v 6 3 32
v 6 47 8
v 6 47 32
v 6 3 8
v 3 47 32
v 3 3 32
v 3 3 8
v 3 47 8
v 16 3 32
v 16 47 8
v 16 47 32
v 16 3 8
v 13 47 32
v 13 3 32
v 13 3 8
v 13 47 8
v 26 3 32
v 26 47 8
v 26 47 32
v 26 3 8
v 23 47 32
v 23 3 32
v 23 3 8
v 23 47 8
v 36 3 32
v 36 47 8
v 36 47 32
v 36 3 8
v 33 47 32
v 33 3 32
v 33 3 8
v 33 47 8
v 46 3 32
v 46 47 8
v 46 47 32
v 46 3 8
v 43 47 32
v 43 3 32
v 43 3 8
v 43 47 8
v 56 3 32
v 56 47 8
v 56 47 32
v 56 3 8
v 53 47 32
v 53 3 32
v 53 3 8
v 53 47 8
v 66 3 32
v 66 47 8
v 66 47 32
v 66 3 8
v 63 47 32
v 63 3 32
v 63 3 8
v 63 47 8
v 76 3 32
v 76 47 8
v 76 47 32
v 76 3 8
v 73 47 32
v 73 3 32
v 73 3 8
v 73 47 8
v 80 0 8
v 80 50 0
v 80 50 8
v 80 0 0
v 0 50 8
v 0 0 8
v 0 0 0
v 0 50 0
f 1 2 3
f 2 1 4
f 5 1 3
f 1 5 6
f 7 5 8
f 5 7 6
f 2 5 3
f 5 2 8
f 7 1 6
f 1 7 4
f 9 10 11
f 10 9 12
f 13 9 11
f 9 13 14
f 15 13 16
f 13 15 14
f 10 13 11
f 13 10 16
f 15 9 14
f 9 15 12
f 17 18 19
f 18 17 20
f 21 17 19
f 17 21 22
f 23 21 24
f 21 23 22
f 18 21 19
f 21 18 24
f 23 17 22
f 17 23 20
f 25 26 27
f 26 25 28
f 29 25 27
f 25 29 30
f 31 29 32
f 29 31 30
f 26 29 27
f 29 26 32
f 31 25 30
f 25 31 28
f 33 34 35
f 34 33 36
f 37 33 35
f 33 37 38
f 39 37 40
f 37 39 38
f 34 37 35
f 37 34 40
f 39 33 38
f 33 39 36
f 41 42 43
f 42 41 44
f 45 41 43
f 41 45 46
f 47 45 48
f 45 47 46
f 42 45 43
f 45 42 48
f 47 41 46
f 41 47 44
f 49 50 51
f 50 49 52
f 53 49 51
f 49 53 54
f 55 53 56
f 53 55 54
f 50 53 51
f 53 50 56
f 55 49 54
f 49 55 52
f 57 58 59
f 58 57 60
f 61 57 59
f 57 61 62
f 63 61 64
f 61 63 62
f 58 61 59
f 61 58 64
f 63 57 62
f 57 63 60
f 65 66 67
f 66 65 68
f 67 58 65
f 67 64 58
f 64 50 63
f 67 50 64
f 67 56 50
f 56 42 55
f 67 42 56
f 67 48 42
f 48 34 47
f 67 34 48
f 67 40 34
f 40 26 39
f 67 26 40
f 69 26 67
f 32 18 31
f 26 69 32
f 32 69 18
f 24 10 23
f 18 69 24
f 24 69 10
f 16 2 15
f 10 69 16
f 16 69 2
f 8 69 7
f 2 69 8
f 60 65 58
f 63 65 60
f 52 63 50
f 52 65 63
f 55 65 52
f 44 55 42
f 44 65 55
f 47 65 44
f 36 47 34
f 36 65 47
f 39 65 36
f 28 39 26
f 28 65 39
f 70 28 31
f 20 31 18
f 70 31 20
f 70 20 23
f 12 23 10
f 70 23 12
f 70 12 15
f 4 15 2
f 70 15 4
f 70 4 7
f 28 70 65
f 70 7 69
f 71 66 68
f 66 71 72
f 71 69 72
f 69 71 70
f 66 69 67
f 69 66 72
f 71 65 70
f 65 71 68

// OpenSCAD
$fn = 32;

// ----------------------------------------------------------------------
// Heatsink: uniform fin block
// ----------------------------------------------------------------------

// --- parameters (mm) ---
base_l = 80;              // base length, X
base_w = 50;              // base width, Y
base_t = 8;               // base plate thickness
fin_h = 25;               // fin height above the base
fin_t = 3;                // fin thickness
edge = 3;                 // margin from the base ends
pitch = 10;               // fin pitch

n_fins = floor((base_l - 2 * edge - fin_t) / pitch) + 1;  // fin count
total_h = base_t + fin_h - 1;  // overall height

union() {
  cube([base_l, base_w, base_t]);
  for (i = [0 : n_fins - 1])
    translate([edge + i * pitch, edge, base_t - 1])
      cube([fin_t, base_w - 2 * edge, fin_h]);
}
